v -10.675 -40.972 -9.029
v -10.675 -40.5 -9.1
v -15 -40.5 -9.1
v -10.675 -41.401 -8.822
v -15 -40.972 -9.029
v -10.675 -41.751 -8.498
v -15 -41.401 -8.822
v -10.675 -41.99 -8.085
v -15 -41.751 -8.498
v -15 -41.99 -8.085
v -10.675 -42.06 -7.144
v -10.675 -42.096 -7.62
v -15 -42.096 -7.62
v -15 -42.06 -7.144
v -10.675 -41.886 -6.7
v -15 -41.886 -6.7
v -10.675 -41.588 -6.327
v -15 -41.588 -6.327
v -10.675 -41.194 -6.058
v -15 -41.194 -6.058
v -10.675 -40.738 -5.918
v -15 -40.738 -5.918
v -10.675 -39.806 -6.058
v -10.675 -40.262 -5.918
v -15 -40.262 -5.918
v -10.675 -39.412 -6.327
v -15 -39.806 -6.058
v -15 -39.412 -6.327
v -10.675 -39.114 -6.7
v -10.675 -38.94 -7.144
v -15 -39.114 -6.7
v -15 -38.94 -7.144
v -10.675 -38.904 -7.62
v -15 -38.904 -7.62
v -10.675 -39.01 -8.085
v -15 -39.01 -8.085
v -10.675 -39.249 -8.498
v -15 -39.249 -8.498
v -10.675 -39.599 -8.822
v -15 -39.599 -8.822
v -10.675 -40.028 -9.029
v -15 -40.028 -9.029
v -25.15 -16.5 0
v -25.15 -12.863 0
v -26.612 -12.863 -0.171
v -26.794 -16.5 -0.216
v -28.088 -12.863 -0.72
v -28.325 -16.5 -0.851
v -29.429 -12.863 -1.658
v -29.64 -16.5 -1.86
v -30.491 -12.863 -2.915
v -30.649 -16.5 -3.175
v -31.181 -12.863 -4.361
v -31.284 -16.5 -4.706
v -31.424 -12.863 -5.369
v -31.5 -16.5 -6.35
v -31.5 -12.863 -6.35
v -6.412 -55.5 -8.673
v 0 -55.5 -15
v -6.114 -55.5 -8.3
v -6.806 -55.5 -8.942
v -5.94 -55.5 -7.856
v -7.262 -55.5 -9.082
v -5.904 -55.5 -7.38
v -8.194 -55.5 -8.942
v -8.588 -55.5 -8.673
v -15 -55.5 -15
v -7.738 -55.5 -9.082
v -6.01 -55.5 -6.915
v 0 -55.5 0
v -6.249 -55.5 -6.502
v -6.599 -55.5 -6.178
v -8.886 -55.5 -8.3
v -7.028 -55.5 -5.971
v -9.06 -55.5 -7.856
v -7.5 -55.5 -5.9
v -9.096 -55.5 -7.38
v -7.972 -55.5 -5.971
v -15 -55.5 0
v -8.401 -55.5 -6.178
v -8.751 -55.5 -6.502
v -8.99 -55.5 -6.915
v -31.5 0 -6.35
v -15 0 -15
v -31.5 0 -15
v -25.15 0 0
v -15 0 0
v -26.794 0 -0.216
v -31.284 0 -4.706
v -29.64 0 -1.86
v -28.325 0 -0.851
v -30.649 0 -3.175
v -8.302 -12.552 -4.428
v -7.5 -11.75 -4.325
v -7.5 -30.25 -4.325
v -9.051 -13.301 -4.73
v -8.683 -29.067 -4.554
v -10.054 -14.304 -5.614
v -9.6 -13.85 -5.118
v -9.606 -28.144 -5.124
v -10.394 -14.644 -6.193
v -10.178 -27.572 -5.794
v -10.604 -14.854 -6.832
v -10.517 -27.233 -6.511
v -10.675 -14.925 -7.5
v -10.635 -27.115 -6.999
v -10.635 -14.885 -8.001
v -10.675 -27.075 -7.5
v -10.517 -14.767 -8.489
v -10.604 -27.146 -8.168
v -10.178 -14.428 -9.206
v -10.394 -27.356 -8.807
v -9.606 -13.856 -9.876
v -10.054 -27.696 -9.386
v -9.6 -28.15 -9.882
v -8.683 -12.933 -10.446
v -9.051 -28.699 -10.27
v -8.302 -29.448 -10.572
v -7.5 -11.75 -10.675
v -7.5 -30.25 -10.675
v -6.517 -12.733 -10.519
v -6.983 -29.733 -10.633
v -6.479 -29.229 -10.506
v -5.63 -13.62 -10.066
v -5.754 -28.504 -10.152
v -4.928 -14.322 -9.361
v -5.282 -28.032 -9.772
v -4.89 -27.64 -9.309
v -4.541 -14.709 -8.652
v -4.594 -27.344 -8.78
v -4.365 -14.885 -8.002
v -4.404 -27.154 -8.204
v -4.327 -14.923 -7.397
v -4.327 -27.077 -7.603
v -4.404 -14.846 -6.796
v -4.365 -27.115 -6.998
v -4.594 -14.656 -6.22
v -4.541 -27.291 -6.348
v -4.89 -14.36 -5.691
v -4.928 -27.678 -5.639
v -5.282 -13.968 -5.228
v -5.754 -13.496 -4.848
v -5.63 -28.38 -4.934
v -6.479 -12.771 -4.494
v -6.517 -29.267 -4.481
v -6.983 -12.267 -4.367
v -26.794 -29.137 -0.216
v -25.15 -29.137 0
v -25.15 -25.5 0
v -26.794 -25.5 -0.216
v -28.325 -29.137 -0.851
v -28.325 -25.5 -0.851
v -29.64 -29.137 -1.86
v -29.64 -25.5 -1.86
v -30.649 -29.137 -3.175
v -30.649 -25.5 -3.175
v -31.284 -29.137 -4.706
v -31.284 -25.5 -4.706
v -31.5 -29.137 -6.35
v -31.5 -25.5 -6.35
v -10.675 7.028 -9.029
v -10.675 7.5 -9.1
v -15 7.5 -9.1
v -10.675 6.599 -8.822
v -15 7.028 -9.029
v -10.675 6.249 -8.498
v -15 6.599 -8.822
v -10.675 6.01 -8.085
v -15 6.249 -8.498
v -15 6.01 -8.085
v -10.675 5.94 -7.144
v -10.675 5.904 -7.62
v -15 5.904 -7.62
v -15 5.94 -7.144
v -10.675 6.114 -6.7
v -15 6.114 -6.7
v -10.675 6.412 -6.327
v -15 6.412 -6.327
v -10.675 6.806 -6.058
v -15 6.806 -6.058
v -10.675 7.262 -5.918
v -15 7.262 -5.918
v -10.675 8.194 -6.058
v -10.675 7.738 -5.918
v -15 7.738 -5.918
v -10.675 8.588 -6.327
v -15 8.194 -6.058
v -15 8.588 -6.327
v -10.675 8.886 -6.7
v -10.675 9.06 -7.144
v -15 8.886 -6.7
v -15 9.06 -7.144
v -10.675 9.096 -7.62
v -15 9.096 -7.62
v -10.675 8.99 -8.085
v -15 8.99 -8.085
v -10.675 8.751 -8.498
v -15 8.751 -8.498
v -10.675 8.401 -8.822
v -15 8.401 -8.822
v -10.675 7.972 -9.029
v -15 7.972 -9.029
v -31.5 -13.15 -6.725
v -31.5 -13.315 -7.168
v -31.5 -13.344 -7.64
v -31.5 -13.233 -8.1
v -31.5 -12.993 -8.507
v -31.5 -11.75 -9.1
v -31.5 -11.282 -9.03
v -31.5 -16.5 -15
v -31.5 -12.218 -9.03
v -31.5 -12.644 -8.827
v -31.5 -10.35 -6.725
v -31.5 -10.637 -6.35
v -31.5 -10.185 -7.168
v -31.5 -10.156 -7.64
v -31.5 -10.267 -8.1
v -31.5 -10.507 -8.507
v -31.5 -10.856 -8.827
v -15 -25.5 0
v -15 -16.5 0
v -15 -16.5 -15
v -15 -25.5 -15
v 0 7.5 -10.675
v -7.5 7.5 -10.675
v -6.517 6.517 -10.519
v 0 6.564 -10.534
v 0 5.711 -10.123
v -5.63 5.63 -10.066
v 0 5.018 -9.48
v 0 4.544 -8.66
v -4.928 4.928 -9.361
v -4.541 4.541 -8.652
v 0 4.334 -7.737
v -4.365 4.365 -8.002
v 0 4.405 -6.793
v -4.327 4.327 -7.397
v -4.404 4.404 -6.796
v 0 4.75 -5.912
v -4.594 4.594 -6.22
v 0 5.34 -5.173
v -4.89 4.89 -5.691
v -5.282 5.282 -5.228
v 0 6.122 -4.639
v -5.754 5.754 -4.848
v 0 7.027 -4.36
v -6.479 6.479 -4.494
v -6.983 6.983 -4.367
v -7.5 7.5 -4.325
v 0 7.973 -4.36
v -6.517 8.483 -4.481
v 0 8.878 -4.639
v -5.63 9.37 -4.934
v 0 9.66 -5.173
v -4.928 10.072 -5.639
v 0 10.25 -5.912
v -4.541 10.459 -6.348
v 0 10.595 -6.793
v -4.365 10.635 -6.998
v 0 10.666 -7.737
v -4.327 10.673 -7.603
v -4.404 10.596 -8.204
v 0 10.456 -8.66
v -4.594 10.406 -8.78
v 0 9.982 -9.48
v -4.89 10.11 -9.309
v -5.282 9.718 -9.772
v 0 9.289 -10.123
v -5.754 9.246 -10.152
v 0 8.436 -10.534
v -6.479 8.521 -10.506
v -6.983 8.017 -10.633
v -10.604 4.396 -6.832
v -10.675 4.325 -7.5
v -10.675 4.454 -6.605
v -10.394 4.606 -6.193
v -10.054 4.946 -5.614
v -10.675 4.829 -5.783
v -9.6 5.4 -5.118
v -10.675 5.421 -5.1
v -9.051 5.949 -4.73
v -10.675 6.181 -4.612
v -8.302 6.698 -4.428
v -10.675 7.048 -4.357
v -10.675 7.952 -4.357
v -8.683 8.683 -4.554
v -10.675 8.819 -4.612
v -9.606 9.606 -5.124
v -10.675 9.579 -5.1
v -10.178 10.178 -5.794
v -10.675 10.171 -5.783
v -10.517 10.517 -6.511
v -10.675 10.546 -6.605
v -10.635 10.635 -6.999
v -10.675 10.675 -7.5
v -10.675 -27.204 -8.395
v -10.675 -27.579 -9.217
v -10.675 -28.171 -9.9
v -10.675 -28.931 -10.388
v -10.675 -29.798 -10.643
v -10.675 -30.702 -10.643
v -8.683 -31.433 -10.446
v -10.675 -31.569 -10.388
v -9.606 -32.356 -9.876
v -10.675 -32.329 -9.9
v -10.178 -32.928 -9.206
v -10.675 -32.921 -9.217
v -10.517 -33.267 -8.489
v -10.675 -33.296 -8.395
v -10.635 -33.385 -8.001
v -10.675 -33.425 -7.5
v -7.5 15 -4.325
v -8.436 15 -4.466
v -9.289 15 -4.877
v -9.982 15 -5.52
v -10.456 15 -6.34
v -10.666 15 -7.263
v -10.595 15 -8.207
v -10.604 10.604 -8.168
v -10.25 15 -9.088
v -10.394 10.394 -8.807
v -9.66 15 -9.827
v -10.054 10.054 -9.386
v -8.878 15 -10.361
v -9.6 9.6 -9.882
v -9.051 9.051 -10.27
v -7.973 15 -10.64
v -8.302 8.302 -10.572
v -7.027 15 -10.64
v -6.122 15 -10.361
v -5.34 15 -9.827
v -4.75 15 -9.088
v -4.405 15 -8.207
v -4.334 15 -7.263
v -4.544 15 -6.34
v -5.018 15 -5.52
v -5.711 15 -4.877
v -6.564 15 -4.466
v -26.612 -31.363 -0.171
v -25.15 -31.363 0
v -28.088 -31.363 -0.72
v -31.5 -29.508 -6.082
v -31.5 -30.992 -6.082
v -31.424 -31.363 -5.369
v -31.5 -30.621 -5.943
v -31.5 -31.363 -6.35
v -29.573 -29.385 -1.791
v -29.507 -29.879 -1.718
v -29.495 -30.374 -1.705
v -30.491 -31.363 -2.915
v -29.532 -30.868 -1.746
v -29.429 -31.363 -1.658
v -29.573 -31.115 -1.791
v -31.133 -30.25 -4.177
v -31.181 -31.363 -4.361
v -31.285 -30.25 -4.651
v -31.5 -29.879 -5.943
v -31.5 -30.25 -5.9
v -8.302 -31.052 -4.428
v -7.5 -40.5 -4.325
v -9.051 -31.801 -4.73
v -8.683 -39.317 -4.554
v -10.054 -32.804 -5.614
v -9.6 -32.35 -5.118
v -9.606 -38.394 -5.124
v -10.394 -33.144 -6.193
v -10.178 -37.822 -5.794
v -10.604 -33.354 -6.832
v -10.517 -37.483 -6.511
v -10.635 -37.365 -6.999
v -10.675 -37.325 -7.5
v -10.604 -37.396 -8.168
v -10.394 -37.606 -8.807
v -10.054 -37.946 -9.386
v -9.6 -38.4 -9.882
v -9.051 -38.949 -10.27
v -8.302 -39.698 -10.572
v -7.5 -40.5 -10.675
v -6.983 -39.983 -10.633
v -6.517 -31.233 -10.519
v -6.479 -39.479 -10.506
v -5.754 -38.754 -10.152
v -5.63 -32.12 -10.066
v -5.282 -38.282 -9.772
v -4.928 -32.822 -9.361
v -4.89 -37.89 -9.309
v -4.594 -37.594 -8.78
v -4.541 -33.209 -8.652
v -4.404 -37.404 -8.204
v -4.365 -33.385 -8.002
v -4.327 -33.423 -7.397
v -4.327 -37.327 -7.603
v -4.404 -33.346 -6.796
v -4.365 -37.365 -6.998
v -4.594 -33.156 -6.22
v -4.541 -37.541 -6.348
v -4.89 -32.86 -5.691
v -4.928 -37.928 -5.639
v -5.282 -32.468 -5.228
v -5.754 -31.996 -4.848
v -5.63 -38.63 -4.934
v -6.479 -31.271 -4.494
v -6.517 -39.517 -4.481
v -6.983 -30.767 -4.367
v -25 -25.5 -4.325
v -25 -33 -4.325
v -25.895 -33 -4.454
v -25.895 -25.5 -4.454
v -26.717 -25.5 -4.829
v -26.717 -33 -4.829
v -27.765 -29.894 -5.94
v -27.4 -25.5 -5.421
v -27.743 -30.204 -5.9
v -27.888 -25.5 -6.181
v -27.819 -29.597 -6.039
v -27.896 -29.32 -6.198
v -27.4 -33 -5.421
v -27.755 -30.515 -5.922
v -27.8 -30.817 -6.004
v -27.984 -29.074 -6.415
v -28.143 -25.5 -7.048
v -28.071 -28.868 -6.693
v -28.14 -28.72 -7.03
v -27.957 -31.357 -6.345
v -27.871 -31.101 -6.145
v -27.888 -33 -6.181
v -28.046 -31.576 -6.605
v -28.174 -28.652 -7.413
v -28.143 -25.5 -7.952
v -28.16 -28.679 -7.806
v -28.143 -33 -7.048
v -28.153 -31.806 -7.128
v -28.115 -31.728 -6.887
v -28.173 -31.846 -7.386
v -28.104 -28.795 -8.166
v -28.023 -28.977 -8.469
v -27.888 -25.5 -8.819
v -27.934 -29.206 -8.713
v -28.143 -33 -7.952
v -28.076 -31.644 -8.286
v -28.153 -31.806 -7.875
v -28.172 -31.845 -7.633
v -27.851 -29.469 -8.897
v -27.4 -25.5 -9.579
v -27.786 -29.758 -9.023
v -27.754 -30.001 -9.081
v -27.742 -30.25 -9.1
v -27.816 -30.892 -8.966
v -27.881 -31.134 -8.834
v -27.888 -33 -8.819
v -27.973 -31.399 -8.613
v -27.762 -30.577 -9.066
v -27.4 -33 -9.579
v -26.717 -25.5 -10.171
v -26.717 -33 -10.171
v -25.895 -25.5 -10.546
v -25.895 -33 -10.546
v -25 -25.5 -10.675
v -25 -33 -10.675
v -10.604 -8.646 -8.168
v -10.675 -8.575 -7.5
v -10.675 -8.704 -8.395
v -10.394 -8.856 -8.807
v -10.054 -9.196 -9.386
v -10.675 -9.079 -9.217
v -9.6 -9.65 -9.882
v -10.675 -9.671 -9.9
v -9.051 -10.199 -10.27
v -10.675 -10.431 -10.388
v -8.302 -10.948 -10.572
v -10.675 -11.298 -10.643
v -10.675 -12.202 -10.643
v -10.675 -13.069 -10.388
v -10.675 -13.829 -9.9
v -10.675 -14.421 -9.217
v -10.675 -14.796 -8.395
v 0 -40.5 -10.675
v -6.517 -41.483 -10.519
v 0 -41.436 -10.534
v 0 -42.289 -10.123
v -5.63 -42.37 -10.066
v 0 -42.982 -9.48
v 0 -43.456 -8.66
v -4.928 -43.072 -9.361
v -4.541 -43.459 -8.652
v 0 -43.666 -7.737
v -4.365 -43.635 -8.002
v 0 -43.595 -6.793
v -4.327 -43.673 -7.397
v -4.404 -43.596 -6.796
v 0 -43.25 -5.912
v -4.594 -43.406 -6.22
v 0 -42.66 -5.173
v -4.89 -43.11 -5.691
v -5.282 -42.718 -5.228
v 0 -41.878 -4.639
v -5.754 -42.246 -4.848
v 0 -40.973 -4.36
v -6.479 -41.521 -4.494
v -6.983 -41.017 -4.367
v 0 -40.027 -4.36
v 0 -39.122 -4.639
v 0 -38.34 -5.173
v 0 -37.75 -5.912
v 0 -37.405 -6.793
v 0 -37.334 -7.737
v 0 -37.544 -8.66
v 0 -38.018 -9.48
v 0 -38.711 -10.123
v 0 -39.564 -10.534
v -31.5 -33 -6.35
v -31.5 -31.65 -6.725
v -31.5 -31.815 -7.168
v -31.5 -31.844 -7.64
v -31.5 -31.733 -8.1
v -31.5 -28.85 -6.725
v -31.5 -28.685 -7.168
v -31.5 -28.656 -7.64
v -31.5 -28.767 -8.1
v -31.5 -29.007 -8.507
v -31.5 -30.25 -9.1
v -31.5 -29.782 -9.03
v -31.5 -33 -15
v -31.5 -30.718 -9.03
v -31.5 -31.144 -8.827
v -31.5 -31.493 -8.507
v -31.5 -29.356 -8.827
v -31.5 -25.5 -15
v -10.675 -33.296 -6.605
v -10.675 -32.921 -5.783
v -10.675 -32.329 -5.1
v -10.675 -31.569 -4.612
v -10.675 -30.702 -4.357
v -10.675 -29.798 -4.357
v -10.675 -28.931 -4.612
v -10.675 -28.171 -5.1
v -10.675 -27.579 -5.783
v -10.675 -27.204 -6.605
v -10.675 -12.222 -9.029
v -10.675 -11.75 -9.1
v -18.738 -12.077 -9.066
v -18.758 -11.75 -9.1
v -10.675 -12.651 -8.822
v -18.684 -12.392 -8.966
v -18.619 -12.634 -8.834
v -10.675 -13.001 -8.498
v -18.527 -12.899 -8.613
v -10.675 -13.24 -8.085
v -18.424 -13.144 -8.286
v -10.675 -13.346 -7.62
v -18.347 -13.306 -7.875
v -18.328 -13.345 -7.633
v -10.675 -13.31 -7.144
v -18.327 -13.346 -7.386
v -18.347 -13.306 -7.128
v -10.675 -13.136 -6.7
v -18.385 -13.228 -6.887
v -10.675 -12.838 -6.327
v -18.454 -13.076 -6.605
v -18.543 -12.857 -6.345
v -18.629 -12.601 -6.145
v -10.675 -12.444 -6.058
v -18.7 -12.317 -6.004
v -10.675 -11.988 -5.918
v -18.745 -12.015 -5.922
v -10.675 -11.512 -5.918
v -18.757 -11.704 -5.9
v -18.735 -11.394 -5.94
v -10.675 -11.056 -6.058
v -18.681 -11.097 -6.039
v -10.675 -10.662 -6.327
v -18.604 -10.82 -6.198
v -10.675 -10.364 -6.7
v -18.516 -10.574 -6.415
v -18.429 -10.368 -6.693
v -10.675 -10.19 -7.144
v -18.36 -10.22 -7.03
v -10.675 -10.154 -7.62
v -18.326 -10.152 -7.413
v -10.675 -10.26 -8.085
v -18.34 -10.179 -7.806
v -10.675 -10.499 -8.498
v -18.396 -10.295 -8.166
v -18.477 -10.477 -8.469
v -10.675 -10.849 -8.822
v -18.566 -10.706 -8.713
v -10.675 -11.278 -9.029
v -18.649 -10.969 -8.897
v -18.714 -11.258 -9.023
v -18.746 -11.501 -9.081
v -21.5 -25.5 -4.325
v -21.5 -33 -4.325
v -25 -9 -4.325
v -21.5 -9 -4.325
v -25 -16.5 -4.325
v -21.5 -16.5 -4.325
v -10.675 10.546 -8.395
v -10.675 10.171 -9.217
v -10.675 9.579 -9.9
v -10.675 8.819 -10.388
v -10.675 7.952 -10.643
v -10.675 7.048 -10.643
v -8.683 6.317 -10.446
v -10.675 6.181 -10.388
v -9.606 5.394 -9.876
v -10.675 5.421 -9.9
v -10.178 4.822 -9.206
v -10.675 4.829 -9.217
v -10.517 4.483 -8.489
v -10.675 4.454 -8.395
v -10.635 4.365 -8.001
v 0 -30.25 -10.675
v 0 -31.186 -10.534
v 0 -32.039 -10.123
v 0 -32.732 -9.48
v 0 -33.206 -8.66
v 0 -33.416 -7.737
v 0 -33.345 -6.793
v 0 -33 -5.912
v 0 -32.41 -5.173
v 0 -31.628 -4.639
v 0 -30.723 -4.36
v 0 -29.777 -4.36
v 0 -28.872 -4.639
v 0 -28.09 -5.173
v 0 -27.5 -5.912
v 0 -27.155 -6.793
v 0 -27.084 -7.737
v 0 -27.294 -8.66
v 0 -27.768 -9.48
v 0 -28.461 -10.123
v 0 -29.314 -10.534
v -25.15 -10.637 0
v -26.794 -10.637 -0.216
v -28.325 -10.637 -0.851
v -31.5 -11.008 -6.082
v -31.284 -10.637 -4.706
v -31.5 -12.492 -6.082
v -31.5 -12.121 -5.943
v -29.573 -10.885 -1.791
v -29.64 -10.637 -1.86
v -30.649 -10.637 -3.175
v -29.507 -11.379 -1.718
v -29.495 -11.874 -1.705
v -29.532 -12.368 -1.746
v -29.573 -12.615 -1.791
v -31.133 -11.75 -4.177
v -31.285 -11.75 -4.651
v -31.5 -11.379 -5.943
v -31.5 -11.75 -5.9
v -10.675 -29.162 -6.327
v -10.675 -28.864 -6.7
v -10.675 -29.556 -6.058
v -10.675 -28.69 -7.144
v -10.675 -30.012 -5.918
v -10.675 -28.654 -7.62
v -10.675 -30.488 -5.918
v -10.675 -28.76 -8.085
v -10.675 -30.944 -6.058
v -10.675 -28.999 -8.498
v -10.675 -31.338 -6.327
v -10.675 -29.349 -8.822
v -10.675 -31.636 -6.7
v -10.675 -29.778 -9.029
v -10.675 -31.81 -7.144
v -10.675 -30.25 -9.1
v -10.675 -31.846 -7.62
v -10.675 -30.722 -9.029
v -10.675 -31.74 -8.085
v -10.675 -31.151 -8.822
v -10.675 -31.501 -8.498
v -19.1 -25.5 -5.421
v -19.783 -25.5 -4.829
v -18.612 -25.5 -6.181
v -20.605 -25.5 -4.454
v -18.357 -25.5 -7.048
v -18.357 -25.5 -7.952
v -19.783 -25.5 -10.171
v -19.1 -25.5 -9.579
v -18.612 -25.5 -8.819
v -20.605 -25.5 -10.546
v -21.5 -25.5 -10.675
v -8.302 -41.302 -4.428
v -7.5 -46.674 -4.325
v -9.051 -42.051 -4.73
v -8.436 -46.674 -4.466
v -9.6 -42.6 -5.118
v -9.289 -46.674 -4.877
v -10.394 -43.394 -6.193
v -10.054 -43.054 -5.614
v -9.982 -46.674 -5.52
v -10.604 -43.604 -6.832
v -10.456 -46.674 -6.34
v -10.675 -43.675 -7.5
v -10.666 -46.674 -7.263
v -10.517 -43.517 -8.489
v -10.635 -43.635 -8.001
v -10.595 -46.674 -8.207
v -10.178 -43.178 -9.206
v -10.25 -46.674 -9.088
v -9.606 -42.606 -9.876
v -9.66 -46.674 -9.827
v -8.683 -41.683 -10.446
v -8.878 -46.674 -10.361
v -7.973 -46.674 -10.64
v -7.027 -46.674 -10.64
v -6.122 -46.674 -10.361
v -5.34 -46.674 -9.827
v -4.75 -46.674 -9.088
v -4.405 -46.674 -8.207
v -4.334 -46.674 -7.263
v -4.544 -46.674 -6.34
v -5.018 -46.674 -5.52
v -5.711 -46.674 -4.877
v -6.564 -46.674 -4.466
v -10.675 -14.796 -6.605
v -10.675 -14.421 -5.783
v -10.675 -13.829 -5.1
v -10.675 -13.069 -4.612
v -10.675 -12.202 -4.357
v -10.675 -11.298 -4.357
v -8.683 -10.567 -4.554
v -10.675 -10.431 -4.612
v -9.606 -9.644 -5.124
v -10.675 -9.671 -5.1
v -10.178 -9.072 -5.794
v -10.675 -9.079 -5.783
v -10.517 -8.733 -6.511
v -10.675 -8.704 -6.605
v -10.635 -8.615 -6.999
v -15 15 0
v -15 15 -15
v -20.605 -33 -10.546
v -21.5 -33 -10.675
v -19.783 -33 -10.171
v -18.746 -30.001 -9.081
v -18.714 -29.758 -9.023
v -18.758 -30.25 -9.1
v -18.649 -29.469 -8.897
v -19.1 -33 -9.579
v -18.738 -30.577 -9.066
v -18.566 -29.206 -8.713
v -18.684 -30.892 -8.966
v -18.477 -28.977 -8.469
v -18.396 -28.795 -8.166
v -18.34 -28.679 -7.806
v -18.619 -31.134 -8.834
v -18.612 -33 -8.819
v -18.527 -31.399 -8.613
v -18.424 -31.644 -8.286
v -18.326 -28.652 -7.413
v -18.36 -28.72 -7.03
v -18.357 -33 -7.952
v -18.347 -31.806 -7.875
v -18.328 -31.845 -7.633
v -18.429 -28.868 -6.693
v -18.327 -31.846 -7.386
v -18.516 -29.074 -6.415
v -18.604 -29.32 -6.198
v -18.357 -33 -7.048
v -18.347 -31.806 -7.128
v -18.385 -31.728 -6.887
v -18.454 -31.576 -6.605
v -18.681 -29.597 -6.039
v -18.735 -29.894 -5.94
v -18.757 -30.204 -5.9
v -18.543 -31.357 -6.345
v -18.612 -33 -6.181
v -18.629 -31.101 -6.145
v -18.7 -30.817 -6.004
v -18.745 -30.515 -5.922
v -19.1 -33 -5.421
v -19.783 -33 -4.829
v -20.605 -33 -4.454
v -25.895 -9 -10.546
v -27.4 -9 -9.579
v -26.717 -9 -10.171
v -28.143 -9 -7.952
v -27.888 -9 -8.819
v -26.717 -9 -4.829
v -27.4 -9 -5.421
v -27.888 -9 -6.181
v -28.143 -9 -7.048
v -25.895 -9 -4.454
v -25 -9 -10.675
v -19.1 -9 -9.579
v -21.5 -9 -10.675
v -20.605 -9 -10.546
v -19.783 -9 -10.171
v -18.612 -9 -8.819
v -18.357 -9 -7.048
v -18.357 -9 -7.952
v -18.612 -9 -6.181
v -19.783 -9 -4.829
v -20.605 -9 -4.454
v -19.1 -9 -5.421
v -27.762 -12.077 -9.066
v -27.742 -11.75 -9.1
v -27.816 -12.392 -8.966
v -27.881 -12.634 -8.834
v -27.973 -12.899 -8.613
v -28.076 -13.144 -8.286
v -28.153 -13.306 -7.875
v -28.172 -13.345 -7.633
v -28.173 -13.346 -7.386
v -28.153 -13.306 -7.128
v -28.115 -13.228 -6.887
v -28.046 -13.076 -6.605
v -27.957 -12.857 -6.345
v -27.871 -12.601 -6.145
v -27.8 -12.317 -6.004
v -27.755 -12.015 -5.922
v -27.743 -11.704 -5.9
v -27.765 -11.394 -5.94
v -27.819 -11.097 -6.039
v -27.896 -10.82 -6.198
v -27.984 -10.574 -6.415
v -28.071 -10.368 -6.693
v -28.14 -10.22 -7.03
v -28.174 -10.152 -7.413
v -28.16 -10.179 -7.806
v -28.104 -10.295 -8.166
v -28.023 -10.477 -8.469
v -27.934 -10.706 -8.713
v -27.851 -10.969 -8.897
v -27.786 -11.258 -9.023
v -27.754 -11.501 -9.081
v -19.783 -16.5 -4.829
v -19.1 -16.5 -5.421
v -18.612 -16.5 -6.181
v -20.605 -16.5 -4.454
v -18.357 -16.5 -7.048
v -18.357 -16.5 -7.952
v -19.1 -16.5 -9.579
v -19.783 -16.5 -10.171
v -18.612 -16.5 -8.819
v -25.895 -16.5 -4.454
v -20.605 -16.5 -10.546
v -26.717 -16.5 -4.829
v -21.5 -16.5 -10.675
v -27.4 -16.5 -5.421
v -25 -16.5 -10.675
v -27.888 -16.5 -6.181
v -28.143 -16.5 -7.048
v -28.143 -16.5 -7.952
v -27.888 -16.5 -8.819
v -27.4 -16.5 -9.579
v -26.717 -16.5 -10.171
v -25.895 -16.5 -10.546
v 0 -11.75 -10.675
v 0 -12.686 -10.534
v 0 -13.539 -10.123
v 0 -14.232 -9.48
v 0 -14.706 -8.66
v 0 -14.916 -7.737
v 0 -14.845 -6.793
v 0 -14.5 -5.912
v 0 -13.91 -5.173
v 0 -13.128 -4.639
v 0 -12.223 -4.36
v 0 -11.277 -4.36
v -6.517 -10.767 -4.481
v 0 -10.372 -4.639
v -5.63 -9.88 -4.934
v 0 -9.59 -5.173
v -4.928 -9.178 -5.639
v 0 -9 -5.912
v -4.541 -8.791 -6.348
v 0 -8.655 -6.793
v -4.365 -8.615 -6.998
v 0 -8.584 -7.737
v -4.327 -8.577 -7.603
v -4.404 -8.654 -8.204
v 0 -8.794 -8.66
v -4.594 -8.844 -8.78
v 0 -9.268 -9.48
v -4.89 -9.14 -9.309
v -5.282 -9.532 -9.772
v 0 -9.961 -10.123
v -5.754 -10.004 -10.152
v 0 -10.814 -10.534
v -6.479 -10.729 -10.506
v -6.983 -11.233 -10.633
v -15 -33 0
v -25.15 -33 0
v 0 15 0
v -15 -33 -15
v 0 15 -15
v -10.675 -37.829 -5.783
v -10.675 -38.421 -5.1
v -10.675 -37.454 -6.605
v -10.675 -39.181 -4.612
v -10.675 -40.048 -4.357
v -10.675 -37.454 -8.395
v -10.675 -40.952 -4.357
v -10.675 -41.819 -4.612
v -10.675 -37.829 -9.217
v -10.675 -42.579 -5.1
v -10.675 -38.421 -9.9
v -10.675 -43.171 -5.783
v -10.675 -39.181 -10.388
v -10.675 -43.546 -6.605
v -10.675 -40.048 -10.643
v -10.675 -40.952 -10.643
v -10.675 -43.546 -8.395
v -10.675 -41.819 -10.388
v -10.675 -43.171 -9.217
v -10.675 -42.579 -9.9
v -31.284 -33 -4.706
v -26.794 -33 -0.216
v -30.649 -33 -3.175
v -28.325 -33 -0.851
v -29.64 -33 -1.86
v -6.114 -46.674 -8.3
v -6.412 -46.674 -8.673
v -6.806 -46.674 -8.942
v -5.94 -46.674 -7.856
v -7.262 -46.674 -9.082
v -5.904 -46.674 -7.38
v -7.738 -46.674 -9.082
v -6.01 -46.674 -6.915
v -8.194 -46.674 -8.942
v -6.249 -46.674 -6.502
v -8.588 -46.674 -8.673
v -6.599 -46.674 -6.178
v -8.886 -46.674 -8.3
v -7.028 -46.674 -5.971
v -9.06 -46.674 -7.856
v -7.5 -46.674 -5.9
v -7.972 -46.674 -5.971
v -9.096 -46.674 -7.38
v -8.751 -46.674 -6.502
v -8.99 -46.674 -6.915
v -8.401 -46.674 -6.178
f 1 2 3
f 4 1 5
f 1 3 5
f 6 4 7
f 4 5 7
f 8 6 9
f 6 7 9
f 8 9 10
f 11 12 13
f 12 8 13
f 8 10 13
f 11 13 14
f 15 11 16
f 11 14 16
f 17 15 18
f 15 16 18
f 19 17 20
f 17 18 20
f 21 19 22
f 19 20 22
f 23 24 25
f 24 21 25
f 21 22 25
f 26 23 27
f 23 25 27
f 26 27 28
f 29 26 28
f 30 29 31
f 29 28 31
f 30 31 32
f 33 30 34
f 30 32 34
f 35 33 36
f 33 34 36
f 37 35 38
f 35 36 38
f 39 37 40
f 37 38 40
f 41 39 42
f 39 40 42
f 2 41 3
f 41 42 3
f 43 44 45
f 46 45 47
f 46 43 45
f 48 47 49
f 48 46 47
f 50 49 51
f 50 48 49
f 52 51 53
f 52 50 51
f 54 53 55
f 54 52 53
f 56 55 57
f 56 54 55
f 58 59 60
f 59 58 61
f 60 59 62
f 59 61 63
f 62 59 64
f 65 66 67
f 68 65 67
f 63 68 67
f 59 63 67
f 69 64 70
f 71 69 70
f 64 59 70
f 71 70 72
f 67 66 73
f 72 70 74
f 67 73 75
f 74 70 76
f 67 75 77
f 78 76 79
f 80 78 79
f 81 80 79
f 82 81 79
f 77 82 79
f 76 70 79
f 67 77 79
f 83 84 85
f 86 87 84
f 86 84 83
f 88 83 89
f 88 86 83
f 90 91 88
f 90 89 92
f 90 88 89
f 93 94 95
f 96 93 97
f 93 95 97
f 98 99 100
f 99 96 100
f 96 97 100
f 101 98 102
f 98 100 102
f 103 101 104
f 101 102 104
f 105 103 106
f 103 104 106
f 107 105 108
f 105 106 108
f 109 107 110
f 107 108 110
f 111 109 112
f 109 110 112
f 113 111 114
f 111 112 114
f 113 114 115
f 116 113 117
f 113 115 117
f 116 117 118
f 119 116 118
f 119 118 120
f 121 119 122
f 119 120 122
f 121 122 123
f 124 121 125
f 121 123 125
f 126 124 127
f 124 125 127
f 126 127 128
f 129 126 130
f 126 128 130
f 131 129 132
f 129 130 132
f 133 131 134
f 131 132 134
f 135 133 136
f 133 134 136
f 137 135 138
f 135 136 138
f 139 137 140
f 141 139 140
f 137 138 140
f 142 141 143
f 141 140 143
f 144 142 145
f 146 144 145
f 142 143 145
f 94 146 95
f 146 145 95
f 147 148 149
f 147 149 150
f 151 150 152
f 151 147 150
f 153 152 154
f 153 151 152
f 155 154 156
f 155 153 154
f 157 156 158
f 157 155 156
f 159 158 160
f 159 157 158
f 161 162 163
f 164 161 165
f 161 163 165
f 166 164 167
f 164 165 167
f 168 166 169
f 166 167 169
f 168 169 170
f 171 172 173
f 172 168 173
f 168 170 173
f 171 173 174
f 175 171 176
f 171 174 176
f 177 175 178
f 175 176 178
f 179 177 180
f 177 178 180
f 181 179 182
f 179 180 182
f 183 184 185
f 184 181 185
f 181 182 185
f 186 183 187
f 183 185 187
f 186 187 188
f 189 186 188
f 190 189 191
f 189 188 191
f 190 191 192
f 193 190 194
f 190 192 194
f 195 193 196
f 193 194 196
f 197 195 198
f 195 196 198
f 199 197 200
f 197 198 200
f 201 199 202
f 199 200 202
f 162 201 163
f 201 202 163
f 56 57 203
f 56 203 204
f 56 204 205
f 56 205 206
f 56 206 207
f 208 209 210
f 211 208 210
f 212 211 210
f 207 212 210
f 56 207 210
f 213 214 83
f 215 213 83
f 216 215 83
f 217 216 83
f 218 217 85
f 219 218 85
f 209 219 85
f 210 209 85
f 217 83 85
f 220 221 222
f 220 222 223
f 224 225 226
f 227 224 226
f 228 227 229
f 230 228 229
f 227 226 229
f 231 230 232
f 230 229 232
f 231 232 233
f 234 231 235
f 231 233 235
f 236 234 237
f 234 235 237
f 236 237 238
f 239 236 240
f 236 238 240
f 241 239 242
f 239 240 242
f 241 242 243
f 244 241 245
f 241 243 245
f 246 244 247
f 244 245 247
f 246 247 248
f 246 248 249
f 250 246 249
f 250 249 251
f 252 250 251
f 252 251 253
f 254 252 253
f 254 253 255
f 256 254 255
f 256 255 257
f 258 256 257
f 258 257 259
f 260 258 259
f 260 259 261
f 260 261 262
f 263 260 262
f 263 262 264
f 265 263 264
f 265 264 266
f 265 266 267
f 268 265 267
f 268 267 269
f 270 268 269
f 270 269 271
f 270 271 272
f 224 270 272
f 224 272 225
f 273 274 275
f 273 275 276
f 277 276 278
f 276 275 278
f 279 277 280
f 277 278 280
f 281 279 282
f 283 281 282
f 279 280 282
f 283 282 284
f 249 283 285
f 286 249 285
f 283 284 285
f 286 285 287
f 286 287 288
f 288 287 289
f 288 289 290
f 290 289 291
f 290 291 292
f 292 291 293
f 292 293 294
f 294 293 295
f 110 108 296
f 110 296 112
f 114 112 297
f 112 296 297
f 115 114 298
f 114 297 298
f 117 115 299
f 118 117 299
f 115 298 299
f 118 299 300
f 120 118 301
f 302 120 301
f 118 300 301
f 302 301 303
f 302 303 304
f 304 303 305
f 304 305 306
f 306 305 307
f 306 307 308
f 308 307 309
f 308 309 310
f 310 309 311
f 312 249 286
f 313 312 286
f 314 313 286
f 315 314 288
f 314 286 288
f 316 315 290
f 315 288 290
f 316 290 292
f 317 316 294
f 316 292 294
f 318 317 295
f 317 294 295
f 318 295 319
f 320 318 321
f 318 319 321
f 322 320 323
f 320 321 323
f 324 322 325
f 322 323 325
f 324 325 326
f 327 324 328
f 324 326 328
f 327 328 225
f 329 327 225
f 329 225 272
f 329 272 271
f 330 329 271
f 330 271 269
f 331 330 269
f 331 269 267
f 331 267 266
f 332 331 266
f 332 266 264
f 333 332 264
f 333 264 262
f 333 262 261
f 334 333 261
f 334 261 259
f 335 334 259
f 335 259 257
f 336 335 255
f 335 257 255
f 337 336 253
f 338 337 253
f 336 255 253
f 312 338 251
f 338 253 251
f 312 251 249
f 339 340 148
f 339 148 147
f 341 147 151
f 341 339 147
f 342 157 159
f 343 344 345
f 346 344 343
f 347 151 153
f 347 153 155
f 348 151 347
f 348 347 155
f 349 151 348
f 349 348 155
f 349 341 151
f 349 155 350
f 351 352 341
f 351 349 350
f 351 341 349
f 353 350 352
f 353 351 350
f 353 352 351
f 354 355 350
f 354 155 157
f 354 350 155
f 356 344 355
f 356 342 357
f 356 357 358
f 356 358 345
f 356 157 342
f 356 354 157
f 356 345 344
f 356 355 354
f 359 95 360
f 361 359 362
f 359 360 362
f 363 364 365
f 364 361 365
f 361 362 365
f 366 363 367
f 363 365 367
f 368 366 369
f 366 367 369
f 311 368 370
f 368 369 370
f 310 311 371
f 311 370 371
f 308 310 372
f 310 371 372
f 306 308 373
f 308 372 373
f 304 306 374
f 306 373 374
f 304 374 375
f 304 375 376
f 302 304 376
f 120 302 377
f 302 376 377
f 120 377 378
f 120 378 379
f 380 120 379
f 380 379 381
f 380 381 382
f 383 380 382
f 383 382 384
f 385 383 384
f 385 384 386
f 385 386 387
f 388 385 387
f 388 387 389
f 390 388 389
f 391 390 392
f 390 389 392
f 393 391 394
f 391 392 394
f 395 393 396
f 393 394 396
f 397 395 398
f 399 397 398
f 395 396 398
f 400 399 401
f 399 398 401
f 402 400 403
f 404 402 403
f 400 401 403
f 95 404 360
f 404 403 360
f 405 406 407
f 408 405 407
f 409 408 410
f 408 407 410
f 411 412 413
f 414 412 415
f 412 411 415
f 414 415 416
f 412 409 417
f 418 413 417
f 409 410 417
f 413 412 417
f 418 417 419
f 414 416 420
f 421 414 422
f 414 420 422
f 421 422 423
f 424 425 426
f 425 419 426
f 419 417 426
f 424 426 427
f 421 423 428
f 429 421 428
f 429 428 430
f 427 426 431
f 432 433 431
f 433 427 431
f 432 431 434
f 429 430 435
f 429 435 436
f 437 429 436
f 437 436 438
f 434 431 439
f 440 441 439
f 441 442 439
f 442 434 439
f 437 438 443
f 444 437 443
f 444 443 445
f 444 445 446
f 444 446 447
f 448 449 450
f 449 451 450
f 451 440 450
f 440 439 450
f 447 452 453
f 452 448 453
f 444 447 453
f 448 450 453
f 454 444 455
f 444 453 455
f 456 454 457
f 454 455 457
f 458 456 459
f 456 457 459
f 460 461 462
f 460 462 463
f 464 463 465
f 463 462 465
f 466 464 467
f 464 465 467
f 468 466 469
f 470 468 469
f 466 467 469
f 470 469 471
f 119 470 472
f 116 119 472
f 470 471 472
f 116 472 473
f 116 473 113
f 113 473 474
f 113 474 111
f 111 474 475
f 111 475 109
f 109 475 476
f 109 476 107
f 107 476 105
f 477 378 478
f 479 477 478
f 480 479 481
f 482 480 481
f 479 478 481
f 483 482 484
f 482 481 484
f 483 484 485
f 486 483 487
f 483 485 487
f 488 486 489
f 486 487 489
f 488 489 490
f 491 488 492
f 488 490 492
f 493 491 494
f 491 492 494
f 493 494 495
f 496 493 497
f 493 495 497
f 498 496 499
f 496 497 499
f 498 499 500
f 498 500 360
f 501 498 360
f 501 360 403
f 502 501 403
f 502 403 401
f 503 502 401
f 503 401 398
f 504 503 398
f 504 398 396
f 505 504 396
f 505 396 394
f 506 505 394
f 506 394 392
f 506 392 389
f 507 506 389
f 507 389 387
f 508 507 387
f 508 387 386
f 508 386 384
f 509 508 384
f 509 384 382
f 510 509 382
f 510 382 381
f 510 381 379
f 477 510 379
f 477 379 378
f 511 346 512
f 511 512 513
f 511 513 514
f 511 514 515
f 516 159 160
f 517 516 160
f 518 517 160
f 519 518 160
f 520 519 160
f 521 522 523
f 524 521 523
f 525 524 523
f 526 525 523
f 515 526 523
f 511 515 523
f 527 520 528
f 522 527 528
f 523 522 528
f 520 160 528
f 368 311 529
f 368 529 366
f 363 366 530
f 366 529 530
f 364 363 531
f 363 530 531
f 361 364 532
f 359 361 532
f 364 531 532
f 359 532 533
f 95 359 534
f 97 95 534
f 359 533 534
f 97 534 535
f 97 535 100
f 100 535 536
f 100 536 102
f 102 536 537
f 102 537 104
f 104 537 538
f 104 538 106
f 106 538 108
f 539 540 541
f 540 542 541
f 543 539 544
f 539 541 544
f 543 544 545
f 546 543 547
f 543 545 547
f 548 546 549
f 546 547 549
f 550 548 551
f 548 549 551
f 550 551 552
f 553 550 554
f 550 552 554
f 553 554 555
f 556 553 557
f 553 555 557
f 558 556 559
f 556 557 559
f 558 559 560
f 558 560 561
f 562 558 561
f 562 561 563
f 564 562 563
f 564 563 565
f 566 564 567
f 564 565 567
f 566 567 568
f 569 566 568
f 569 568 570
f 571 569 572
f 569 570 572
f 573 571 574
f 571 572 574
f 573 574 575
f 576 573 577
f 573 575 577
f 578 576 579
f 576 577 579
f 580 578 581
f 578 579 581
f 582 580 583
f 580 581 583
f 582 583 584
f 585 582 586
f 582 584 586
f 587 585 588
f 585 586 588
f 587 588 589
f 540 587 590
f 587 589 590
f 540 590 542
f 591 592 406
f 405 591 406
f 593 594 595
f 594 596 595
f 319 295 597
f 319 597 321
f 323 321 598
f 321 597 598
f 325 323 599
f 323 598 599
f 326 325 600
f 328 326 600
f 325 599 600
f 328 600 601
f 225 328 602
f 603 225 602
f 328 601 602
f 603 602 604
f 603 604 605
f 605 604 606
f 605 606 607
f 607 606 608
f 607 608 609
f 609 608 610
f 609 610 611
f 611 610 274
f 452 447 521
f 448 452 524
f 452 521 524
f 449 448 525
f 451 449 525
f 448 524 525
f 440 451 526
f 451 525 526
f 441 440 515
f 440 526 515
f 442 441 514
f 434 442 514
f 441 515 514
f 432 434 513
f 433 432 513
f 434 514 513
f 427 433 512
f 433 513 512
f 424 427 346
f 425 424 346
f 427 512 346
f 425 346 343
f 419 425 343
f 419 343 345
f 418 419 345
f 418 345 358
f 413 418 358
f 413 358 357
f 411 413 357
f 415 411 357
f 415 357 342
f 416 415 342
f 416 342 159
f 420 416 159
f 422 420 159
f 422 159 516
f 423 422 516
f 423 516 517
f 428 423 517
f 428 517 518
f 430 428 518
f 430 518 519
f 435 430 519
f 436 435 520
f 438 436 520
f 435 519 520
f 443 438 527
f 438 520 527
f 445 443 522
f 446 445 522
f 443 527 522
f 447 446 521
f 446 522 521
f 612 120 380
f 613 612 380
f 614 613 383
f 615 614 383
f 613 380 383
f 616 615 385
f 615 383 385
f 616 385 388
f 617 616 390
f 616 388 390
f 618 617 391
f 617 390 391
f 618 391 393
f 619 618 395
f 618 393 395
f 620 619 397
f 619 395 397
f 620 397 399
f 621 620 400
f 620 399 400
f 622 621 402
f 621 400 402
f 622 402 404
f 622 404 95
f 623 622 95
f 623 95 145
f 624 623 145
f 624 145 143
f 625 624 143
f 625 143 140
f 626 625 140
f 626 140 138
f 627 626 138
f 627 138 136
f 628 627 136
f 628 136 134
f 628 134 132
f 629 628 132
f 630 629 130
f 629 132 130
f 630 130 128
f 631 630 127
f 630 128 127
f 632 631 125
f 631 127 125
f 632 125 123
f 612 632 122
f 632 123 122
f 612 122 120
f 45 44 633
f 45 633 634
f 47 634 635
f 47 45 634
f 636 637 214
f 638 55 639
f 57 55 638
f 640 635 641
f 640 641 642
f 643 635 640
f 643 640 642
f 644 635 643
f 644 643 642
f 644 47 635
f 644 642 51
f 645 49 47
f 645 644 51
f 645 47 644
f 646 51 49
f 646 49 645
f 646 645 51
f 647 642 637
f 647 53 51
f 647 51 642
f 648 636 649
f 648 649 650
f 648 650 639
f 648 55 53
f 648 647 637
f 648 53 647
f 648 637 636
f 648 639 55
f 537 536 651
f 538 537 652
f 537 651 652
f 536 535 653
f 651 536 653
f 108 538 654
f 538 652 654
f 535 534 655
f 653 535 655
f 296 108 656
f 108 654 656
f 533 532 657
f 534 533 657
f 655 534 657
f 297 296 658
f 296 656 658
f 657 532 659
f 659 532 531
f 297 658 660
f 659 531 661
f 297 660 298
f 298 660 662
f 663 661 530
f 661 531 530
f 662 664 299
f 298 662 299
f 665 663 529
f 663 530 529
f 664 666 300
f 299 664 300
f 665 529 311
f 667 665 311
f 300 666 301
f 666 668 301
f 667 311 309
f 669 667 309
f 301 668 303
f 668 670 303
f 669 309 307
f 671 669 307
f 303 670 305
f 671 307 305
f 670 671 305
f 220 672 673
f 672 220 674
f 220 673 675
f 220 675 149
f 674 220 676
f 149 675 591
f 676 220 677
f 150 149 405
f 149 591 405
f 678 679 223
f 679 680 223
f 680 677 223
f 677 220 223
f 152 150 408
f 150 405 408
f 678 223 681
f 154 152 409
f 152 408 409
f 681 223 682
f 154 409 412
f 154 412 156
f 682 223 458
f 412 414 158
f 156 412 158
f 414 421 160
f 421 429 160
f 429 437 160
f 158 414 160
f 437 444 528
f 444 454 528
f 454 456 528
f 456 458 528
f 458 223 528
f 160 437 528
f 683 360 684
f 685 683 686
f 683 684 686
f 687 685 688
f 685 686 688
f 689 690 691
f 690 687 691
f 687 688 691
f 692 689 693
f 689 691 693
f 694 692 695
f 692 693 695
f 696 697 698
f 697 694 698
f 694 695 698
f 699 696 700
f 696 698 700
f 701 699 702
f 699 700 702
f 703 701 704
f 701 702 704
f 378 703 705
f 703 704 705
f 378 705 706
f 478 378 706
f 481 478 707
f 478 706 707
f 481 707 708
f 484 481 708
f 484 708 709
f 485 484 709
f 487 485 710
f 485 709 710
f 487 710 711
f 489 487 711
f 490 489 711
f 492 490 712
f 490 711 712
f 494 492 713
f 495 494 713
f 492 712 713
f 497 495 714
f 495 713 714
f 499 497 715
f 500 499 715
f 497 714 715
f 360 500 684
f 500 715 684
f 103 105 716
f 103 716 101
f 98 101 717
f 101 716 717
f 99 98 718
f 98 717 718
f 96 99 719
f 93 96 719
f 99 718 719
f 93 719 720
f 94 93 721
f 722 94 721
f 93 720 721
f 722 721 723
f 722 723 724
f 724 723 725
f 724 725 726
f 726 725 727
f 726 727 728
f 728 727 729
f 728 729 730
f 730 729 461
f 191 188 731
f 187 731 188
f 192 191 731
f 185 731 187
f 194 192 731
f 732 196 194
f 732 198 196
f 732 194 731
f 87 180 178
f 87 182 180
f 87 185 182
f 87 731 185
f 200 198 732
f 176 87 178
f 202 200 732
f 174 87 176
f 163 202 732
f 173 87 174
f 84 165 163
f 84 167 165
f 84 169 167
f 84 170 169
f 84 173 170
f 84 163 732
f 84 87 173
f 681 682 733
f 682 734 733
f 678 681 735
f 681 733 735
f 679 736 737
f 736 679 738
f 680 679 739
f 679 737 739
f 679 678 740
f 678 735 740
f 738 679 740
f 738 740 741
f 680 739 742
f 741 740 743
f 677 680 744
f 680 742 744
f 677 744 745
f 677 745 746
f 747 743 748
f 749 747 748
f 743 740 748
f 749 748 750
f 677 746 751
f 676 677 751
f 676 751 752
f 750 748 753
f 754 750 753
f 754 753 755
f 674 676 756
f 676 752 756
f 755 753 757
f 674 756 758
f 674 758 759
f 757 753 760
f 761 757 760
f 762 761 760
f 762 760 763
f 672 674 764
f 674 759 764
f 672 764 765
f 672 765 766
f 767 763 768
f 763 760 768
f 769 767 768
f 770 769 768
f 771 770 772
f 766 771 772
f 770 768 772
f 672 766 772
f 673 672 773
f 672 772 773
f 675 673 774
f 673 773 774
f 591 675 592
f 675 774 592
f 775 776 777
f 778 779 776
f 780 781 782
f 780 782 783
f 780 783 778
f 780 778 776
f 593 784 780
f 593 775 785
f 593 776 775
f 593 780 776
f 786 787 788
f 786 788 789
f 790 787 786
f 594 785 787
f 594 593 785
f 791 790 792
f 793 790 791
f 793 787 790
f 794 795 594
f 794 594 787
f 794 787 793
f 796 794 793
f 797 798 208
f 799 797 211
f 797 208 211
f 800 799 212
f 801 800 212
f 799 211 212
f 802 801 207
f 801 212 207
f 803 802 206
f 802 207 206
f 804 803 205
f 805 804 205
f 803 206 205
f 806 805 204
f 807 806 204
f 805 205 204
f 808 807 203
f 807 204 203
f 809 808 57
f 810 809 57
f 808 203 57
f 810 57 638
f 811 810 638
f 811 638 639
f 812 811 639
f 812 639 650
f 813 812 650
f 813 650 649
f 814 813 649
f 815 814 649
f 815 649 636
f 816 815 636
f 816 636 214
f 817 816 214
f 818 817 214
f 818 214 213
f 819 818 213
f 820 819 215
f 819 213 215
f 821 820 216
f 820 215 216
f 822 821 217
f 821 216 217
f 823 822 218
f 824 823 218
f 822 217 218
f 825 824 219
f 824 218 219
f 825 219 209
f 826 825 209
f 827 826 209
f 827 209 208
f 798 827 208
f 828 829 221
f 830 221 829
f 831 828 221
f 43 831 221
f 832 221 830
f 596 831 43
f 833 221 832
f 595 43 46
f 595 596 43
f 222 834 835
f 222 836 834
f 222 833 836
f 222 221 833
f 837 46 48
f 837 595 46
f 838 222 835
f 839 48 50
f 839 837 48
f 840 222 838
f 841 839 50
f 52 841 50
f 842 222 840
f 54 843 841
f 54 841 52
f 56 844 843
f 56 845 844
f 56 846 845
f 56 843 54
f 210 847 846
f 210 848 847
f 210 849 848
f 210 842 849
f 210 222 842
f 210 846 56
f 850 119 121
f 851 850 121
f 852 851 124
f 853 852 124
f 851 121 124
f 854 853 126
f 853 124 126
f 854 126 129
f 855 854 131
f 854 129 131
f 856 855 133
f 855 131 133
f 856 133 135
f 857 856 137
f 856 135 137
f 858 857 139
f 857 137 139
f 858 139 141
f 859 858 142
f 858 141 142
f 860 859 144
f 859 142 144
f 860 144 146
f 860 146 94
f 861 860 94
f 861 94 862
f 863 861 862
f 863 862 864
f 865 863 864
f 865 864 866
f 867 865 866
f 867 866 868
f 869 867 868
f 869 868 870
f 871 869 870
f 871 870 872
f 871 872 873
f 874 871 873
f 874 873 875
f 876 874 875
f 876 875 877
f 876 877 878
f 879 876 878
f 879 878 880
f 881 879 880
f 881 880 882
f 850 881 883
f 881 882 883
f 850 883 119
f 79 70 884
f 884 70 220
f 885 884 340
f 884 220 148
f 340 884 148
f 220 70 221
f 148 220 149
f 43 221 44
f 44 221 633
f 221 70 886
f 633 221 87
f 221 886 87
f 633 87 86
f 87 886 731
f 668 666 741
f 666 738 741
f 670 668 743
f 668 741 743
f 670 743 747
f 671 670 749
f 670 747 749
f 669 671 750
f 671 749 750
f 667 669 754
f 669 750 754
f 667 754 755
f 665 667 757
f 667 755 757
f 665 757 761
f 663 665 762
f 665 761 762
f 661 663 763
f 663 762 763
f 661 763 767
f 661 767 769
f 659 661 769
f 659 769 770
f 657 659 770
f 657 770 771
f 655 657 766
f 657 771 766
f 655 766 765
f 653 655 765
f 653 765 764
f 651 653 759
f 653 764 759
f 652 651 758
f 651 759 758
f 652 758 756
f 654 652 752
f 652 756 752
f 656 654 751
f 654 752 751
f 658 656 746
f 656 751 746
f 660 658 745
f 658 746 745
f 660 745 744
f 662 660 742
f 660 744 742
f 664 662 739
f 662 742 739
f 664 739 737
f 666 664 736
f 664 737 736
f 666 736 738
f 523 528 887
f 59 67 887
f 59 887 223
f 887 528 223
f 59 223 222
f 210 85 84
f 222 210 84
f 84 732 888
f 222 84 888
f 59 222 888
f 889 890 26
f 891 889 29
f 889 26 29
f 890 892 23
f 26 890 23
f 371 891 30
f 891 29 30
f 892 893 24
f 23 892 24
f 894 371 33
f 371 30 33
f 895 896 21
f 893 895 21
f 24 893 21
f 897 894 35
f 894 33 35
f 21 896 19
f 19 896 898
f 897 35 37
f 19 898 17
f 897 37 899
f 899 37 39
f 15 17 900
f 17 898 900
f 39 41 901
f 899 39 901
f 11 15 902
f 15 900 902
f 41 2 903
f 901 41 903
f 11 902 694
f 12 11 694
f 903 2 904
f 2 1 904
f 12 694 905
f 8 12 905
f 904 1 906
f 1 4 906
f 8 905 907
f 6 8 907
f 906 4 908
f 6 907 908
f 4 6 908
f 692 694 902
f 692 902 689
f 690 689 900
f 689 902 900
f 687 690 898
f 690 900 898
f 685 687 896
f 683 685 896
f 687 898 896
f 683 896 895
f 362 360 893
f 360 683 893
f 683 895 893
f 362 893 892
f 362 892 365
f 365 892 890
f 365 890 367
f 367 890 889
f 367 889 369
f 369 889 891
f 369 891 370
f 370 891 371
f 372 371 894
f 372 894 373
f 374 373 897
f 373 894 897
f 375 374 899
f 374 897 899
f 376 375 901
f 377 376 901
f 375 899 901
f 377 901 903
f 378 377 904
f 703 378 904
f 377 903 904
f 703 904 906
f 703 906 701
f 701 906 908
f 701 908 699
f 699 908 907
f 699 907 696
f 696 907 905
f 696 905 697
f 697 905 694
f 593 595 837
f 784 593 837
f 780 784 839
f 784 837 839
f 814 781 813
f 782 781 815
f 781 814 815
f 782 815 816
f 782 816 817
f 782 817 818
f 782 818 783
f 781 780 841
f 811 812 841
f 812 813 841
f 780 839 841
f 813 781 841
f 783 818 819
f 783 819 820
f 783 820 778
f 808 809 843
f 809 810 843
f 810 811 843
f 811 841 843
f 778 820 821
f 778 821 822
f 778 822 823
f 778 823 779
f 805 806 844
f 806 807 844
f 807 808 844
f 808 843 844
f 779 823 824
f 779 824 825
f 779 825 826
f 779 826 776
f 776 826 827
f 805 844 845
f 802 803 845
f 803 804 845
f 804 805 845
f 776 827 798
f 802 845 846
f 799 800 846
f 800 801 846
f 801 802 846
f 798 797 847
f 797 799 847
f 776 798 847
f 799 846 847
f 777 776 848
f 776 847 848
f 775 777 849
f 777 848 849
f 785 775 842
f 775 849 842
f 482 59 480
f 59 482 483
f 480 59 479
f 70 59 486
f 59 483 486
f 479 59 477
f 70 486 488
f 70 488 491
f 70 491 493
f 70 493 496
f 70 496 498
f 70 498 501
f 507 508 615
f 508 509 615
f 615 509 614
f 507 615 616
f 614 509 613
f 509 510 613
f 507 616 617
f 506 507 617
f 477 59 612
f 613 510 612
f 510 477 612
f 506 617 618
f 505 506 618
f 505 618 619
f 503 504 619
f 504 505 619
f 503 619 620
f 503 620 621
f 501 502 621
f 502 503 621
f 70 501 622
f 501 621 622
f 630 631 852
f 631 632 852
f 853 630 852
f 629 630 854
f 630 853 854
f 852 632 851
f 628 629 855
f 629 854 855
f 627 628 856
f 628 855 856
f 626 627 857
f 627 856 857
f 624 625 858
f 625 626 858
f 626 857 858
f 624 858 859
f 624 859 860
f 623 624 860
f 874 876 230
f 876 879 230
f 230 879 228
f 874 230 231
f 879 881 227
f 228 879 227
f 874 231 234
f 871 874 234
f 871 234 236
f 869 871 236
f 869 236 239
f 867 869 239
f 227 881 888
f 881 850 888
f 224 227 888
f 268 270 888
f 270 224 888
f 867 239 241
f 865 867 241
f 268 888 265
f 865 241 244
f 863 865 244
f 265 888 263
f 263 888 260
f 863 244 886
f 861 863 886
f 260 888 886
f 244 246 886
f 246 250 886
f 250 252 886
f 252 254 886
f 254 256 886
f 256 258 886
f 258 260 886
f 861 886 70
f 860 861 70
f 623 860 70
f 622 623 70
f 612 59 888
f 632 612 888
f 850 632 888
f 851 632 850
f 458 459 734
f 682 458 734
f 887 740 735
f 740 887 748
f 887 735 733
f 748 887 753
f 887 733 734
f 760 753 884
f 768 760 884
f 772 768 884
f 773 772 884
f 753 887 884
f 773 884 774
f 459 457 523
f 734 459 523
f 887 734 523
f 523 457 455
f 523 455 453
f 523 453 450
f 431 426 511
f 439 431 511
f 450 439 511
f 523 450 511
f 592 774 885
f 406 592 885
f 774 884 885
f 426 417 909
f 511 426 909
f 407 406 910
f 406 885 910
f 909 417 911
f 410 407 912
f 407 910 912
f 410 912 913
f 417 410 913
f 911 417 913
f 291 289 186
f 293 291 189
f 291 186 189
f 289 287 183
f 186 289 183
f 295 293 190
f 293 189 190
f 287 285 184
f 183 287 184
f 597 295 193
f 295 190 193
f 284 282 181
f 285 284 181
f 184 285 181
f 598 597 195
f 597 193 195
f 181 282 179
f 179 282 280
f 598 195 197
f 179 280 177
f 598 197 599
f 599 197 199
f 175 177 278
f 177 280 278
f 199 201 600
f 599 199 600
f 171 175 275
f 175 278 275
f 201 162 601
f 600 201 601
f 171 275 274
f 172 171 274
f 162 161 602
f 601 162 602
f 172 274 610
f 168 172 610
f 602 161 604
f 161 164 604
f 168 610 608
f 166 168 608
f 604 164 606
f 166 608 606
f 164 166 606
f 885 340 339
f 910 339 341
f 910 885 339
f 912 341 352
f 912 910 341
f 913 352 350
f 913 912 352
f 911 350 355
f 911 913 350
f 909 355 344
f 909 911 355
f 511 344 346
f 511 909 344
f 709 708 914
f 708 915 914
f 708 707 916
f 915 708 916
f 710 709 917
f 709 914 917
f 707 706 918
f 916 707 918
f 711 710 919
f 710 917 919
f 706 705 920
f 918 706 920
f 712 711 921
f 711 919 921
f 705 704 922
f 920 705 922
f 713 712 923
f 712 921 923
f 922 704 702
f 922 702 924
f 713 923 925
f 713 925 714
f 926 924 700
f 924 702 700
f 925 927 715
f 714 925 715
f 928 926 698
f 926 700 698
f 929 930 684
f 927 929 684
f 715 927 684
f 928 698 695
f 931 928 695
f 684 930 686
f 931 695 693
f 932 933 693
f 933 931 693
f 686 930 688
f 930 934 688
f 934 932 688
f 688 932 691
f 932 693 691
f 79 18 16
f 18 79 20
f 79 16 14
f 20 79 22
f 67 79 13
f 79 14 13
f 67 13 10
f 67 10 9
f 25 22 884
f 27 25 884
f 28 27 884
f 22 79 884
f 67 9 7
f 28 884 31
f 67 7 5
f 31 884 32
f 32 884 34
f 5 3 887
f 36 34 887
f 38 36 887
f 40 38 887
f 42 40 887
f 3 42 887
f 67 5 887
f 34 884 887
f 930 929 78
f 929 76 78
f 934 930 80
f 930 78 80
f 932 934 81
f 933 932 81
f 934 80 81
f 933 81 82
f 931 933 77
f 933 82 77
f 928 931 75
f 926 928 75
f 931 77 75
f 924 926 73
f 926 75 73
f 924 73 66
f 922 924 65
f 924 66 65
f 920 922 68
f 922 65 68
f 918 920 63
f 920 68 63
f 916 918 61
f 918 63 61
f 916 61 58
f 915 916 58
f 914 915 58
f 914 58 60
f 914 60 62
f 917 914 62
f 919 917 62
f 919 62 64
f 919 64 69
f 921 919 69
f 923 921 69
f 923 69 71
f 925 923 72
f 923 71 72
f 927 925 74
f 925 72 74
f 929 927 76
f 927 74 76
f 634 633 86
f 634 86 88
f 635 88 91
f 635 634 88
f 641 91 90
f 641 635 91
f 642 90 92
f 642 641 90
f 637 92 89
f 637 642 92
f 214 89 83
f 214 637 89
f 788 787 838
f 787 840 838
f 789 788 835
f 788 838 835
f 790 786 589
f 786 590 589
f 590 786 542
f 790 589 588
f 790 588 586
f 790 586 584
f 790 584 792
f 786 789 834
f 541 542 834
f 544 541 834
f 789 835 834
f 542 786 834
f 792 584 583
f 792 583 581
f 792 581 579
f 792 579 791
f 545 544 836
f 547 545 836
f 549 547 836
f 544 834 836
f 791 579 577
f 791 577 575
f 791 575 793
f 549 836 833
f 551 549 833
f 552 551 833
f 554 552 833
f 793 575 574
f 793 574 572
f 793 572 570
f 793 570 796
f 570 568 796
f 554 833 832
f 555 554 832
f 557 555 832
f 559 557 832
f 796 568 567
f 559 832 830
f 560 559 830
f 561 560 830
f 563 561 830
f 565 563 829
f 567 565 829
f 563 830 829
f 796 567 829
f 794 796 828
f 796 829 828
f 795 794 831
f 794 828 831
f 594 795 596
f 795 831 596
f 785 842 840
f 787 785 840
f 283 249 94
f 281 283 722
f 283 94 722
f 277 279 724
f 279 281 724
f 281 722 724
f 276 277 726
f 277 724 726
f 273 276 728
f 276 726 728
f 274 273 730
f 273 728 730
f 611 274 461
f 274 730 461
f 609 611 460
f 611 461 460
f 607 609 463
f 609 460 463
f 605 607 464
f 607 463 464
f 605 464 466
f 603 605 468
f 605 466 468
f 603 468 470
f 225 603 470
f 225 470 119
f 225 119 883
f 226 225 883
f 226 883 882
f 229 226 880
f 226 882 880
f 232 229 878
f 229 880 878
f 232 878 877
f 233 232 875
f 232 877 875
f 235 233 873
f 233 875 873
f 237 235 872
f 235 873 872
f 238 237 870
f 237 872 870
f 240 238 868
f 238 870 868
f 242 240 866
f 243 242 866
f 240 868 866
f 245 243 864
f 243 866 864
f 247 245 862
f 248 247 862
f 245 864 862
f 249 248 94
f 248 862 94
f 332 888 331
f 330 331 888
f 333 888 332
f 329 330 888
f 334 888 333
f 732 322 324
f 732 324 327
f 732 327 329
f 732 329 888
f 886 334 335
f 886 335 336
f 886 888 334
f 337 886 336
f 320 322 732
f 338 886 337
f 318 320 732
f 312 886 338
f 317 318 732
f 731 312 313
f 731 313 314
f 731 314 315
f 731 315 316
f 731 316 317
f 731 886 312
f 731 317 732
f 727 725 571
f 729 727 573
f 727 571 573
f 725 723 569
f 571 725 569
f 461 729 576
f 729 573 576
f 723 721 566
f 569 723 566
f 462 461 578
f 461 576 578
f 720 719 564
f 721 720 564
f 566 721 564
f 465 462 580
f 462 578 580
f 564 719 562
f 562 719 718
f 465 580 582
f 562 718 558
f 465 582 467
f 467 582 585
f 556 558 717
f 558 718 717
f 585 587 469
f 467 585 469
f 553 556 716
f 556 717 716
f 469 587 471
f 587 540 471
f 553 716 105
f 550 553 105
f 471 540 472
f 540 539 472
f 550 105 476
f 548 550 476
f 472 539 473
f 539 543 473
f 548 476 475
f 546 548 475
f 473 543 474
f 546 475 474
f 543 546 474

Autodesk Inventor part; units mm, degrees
ref_plane "YZ Plane" through (0, 0, 0) normal (1, 0, 0) x (0, 1, 0)
ref_plane "XZ Plane" through (0, 0, 0) normal (0, 1, 0) x (-1, 0, 0)
ref_plane "XY Plane" through (0, 0, 0) normal (0, 0, 1) x (1, 0, 0)
sketch "Base Profile" plane through (0, 0, 0) normal (0, 1, 0) x (-1, 0, 0)
  line L0 (0, 0) -> (15, 0)
  line L1 (15, 0) -> (15, -15)
  line L2 (15, -15) -> (0, -15)
  line L3 (0, -15) -> (0, 0)
  line L4 (15, 0) -> (31.5, 0)
  line L5 (31.5, 0) -> (31.5, -15)
  line L6 (31.5, -15) -> (15, -15)
  line L7 (15, -15) -> (15, 0)
  dimension "d164" = 15
  dimension "d165" = 15
  dimension "d166" = 16.5
  dimension "d167" = 15
extrude "Stock" add sketch "Base Profile" against normal blind 33
extrude "Top Extrusion Post" add sketch "Base Profile" along normal blind 15 contours L0 L1 L2 L3
extrude "Lower Extrusion Post" add sketch "Base Profile" against normal blind 22.5 from surface at -33 contours L0 L1 L2 L3
sketch "Sketch27" plane through (0, -33, -15) normal (0, 0, -1) x (-1, 0, 0)
  line L0 (0, -22.5) -> (0, 48) projected
  line L1 (31.5, 0) -> (15, 0) projected
  line L2 (31.5, 33) -> (31.5, 0) projected
  line L3 (15, 33) -> (31.5, 33) projected
  line L4 (15, 33) -> (15, 48) projected
  line L5 (0, 48) -> (15, 48) projected
  line L6 (0, 16.5) -> (31.5, 16.5)
  line L7 (0, 7.5) -> (31.5, 7.5)
  line L8 (15, 33) -> (15, 0)
  line L9 (0, -22.5) -> (15, -22.5) projected
  line L10 (15, 0) -> (15, -22.5) projected
  point P0 (15, 16.5)
  point P1 (15, 7.5)
  dimension "d247" = 16.5
  dimension "d290" = 7.5
extrude "Lower Half Cut" cut sketch "Sketch27" against normal through all contours L8 L6 L2 L7
sketch "Bottom Profile" plane through (-35, -33, -15) normal (0, -1, 0) x (1, 0, 0)
  line L0 (13.5, 7.5) -> (10, 7.5) construction
  line L1 (13.5, 10.675) -> (10, 10.675)
  line L2 (10, 4.325) -> (13.5, 4.325)
  arc A0 (13.5, 4.325) -> (13.5, 10.675) centre (13.5, 7.5) ccw
  arc A1 (10, 10.675) -> (10, 4.325) centre (10, 7.5) ccw
  line L3 (3.5, 15) -> (3.5, 0) projected
  line L4 (35, 15) -> (3.5, 15) projected
  point P0 (11.75, 7.5)
  dimension "d291" = 3.5
  dimension "d292" = 6.35
  dimension "d293" = 6.5
  dimension "d294" = 7.5
extrude "Slot Cut" cut sketch "Bottom Profile" against normal blind 24
sketch "Front Hole Pattern" plane through (0, -33, 0) normal (1, 0, 0) x (0, 0, -1)
  line L0 (0, 0) -> (0, 48) projected
  circle A0 centre (7.5, 40.5) radius 3.175
  line L1 (0, 48) -> (15, 48) projected
  circle A1 centre (7.5, 21.25) radius 3.175
  line L2 (15, 0) -> (0, 0) projected
  circle A2 centre (7.5, -7.5) radius 3.175
  circle A3 centre (7.5, 2.75) radius 3.175
  dimension "d317" = 6.35
  dimension "d318" = 7.5
  dimension "d319" = 7.5
  dimension "d354" = 6.35
  dimension "d356" = 21.25
  dimension "d369" = 6.35
  dimension "d370" = 7.5
  dimension "d371" = 6.35
  dimension "d372" = 2.75
hole "Front Adjustment Hole" at (0, -11.75, -7.5) at (0, -30.25, -7.5) direction (-1, 0, 0) diameter 3.2004 end through all counterbore diameter 6.35 counterbore depth 10.675 clearance for "Socket Head Cap Screw" size "M3" standard "Ansi Metric M Profile"
hole "Front Mounting Hole" at (0, 7.5, -7.5) at (0, -40.5, -7.5) direction (-1, 0, 0) diameter 3.2004 end through all counterbore diameter 6.35 counterbore depth 10.675 clearance for "Socket Head Cap Screw" size "M3" standard "Ansi Metric M Profile"
sketch "Sketch33" plane through (0, 15, 0) normal (0, 1, 0) x (1, 0, 0)
  line L0 (-15, 15) -> (-15, 0) projected
  line L1 (-15, 0) -> (0, 0) projected
  line L2 (0, 0) -> (0, 15) projected
  line L3 (0, 15) -> (-15, 15) projected
  circle A0 centre (-7.5, 7.5) radius 3.175
  dimension "d340" = 6.35
  dimension "d341" = 7.5
  dimension "d342" = 7.5
hole "Top Mounting Hole" at (-7.5, 15, -7.5) direction (0, -1, 0) diameter 3.2004 end through all counterbore diameter 6.35 counterbore depth 61.674 clearance for "Socket Head Cap Screw" size "M3" standard "Ansi Metric M Profile"
fillet "Fillet2" radius 6.35 2 edges at (-31.5, -29.25, 0) (-31.5, -8.25, 0)
equation "\"d164\" = extrusionWidth"
equation "\"d165\" = extrusionWidth"
equation "\"d166\" = idlerLength"
equation "\"d167\" = d165"
equation "\"d168\" = extrusionOffset"
equation "\"extrusionWidth\" = 15"
equation "\"idlerLength\" = 16.5"
equation "\"bearingOffsetFromBottom\" = 7.5"
equation "\"extrusionOffset\" = 33"
equation "\"bearingStackHeight\" = 9"
equation "\"bearingSlotLength\" = 3.5"
equation "\"bearingClearance\" = 13"
equation "\"pinSupportLength\" = 2"
properties part number "A Idler" material "Aluminum 6061"
